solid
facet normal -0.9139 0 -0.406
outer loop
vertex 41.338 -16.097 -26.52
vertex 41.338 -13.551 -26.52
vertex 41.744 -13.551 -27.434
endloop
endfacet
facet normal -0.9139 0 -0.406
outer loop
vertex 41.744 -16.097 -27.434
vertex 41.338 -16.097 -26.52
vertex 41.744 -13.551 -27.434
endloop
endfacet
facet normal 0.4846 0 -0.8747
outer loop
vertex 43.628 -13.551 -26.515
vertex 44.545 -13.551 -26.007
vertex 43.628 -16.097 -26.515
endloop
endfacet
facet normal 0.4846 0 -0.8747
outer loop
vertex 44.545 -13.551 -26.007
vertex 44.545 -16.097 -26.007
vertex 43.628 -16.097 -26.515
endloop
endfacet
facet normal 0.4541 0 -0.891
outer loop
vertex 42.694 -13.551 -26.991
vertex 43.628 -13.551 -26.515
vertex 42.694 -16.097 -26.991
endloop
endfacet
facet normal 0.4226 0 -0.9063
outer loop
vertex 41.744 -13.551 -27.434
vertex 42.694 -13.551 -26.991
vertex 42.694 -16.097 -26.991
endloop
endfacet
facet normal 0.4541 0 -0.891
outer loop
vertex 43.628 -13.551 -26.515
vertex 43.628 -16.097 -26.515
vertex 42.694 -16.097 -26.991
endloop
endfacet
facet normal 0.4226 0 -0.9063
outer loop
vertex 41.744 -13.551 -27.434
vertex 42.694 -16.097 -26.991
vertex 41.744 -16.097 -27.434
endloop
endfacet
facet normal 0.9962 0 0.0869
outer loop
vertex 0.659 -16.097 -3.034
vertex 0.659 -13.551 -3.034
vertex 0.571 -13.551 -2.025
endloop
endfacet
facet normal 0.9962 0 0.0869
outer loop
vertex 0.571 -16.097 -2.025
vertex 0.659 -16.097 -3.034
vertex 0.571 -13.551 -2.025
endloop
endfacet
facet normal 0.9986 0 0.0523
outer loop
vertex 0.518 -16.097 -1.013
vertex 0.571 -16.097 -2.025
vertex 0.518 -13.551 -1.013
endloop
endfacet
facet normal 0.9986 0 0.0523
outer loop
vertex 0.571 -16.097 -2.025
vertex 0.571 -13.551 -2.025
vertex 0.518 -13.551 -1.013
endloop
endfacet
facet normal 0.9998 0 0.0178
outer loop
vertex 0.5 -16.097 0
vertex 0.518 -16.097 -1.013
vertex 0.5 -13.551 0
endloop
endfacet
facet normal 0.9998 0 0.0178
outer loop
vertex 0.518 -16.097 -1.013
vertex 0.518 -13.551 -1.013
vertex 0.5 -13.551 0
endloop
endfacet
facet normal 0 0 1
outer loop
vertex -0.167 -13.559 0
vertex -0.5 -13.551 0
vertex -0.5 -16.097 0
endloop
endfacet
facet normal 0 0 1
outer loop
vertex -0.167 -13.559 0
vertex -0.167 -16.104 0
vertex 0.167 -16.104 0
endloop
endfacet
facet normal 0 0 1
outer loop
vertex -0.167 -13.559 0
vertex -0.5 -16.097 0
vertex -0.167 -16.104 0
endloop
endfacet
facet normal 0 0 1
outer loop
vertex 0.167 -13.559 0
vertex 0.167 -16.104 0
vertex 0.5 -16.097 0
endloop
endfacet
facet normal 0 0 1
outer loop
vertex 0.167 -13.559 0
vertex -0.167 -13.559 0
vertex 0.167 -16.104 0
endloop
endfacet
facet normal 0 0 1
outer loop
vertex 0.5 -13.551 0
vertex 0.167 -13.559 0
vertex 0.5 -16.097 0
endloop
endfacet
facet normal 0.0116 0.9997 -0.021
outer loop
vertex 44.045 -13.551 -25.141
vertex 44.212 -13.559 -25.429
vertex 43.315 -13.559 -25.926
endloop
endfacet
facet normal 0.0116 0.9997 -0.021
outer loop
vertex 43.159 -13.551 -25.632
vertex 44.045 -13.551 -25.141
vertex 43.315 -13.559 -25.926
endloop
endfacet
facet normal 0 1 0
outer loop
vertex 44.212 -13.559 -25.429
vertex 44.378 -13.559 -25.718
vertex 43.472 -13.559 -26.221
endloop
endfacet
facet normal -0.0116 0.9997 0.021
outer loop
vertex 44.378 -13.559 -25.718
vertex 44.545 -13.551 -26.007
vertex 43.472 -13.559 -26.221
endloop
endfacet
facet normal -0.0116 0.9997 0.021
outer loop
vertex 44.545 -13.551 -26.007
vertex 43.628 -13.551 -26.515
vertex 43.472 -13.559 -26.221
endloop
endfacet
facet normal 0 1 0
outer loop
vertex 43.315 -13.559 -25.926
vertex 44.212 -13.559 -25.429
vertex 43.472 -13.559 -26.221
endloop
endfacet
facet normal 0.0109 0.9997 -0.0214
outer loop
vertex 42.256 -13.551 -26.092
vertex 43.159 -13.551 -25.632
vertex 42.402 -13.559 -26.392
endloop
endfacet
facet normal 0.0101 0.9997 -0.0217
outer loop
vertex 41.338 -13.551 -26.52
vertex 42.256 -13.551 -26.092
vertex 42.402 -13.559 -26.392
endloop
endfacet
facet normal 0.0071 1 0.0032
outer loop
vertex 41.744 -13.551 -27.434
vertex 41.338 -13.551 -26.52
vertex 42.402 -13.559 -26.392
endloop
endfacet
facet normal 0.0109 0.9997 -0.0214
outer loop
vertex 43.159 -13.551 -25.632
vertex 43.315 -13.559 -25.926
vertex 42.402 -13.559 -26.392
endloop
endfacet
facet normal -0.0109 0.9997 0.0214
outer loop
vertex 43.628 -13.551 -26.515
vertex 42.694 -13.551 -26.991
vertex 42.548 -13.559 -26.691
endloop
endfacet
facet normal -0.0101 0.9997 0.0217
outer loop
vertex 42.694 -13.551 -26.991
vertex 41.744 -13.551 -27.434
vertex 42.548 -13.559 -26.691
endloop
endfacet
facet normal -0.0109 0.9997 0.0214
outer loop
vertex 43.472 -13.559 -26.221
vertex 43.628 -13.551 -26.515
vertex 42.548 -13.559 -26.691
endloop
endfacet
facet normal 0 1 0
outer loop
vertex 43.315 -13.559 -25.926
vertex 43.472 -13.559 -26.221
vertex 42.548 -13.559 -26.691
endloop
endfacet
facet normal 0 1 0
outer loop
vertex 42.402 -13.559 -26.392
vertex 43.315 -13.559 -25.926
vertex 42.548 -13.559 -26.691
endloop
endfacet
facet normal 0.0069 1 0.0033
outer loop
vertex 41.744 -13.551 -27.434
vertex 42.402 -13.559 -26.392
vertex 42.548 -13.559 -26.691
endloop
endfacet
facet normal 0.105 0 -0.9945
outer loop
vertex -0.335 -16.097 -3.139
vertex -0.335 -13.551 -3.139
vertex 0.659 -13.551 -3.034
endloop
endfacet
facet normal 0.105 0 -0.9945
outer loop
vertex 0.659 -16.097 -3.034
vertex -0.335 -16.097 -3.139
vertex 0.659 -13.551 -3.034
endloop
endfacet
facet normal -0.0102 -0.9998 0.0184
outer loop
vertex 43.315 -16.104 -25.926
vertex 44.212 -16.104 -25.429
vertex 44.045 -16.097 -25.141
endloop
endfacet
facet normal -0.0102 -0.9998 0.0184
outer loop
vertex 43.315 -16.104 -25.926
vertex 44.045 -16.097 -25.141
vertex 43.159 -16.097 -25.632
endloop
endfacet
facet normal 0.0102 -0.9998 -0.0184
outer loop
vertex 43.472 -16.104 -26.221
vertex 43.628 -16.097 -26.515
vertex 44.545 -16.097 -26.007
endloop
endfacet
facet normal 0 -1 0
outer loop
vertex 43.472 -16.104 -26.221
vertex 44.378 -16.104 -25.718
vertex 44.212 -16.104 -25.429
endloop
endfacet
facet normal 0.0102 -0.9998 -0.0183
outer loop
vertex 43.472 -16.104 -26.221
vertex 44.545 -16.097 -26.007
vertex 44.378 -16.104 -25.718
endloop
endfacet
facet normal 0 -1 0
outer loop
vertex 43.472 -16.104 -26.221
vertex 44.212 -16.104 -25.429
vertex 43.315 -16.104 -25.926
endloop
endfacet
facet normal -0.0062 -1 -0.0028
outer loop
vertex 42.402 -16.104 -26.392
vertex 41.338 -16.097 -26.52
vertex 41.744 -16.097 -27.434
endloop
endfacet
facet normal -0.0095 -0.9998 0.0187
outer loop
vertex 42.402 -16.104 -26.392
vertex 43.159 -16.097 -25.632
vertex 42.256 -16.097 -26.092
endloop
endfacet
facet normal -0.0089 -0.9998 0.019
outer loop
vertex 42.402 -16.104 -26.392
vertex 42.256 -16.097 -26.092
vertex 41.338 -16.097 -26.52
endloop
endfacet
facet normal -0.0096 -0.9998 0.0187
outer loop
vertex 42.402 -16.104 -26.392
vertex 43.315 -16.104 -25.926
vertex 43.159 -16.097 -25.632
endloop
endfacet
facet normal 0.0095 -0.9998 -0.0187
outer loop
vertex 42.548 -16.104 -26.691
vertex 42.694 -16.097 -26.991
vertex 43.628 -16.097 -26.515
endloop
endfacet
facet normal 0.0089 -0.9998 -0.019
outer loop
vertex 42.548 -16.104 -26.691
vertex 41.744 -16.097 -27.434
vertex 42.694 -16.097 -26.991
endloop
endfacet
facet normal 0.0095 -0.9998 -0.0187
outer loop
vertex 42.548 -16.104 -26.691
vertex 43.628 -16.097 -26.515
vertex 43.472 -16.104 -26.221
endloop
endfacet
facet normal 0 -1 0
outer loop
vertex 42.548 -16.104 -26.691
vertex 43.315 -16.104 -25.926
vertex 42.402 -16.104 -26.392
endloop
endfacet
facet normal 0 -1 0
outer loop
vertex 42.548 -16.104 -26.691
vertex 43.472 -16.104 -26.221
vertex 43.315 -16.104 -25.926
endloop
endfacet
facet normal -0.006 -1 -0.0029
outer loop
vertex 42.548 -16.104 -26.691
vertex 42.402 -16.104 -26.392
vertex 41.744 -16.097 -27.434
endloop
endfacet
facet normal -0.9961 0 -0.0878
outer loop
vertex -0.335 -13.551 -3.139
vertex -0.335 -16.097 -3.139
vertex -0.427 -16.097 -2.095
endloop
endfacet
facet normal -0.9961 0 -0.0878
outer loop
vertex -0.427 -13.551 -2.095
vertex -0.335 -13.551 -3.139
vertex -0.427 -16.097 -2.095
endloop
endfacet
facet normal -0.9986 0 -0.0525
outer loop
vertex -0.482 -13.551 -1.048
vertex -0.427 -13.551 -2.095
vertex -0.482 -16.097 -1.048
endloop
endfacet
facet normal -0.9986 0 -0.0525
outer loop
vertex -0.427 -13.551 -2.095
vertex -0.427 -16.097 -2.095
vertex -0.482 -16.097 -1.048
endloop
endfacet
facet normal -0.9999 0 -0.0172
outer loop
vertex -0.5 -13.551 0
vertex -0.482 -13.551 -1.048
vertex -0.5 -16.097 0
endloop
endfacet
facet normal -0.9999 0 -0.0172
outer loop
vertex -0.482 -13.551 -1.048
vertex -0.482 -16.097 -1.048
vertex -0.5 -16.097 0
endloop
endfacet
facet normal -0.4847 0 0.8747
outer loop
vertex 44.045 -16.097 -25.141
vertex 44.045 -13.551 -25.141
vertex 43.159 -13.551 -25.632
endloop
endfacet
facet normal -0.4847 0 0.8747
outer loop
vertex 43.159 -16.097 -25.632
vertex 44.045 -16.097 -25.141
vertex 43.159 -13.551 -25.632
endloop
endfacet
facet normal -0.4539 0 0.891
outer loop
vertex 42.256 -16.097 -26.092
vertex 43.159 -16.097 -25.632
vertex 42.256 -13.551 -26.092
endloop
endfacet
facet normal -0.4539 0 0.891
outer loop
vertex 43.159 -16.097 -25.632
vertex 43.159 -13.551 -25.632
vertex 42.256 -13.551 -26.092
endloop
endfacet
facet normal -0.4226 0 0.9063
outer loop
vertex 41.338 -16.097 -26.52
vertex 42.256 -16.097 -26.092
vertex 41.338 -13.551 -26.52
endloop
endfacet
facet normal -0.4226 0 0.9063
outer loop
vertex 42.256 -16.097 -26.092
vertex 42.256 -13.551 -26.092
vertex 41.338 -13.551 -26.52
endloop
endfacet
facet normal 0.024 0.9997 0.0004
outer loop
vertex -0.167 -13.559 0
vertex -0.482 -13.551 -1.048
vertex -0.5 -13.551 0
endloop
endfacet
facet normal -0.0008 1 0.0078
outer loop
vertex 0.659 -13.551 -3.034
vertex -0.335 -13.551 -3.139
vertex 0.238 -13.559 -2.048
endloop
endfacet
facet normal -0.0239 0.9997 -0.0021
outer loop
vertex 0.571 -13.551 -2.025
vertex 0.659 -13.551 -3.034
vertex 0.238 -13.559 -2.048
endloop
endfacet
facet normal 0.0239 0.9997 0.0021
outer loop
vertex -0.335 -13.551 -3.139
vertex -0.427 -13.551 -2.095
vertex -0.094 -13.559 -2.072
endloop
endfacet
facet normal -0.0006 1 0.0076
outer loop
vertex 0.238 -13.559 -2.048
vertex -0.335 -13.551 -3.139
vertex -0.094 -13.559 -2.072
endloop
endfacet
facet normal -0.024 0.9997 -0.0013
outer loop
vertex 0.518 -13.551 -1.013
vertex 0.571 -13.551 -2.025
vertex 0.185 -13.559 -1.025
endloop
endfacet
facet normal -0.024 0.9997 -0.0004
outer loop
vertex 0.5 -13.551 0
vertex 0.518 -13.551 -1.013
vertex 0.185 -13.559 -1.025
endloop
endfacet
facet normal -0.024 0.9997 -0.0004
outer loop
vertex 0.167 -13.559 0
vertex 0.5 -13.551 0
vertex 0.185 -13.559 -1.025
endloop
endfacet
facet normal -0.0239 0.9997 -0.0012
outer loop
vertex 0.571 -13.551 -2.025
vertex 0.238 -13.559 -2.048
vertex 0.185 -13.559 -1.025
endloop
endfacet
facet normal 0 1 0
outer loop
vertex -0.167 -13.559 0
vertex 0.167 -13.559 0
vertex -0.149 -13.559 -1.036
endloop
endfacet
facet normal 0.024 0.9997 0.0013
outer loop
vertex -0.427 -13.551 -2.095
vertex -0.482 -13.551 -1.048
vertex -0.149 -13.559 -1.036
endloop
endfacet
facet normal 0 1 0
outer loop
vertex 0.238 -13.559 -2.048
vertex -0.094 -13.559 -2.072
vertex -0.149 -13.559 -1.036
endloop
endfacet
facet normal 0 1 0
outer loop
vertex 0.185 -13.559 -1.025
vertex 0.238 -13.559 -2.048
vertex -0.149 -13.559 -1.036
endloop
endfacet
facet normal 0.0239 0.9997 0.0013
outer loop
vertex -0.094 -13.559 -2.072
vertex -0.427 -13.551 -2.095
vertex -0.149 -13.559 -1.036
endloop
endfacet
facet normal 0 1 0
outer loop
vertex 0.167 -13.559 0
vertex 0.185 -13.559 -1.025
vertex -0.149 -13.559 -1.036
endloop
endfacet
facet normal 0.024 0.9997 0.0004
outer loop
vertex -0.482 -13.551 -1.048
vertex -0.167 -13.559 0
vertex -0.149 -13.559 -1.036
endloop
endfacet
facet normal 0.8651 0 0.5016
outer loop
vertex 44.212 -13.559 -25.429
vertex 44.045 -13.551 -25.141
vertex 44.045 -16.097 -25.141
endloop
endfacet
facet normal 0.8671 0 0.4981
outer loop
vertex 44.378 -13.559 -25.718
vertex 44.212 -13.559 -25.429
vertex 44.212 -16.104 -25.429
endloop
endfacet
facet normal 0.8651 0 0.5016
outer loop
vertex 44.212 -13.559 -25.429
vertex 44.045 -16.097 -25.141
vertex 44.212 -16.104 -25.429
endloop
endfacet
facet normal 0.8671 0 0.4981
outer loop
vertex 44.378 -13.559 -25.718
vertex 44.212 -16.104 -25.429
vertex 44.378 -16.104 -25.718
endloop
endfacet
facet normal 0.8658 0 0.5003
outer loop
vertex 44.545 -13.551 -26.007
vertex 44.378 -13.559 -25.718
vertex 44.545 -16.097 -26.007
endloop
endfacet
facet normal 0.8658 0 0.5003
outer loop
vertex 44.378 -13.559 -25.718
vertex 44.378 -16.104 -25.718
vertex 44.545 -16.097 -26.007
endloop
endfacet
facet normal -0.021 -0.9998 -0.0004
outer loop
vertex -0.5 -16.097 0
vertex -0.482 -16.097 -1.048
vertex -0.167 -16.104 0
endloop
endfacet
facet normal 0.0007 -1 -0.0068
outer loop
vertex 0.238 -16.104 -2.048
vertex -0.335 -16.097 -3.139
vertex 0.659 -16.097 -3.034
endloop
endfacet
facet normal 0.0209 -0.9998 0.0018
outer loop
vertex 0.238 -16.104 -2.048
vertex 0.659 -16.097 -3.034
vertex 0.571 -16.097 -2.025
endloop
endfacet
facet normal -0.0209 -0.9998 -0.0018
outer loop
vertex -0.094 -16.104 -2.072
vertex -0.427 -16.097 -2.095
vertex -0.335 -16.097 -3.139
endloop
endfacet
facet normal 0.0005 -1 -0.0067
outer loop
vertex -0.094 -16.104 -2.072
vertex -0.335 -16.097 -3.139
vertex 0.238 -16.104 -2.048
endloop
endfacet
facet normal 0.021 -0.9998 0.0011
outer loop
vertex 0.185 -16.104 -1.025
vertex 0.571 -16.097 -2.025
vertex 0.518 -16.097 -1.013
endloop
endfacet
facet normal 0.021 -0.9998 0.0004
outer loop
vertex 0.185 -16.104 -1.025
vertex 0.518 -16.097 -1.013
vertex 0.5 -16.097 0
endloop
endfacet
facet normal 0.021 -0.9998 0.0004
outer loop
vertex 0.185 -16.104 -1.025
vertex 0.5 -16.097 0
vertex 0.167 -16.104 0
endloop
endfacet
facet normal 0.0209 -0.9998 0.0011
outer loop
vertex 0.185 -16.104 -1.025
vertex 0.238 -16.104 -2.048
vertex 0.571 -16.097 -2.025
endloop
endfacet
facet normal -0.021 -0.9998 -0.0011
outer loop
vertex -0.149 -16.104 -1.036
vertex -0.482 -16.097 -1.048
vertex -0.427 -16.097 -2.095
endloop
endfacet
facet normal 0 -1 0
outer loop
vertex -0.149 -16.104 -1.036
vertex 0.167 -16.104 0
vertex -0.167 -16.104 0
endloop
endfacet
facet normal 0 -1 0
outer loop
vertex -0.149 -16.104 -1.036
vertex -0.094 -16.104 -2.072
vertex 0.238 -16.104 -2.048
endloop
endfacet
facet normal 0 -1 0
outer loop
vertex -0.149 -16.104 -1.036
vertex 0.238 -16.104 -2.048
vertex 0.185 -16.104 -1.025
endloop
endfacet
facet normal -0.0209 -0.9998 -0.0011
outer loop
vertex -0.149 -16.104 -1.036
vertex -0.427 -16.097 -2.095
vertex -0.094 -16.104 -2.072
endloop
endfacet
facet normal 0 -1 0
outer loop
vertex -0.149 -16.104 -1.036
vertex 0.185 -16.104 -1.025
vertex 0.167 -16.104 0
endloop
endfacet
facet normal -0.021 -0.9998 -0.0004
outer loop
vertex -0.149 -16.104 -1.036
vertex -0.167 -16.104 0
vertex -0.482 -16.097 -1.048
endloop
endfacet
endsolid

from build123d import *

# Parameters (mm, degrees)
CUT_EXTRUDE2_DEPTH = 20


with BuildPart() as part:
    # Sweep1: sweep along a path in Sketch2
    with BuildLine(Plane(origin=(0, 0, 0), x_dir=(1, 0, 0), z_dir=(0, 1, 0))) as sweep1_path:
        ThreePointArc((44.295, 25.573730174), (14.765, 25.573730174), (0, 0))
    # Sketch1 → Sweep1 (sweep)
    with BuildSketch(Plane.XY):
        with BuildLine():
            Line((-0.5, -13.550778575), (-0.5, -16.097236564))
            ThreePointArc((-0.5, -16.097236564), (0, -16.105), (0.5, -16.097236564))
            Line((0.5, -16.097236564), (0.5, -13.550778575))
            ThreePointArc((0.5, -13.550778575), (0, -13.56), (-0.5, -13.550778575))
        make_face()
    sweep(path=sweep1_path.line)

    # Sketch3 → Cut-Extrude2 (cut)
    with BuildSketch(Plane(origin=(0, 0, 0), x_dir=(1, 0, 0), z_dir=(0, 1, 0))):
        with BuildLine():
            ThreePointArc((0.659029377, 3.034461289), (15.015, 25.140717472), (41.337564748, 26.520224635))
            Line((41.337564748, 26.520224635), (41.744301392, 27.433770093))
            ThreePointArc((41.744301392, 27.433770093), (14.515, 26.006742876), (-0.335492518, 3.138989752))
            Line((-0.335492518, 3.138989752), (0.659029377, 3.034461289))
        make_face()
    extrude(amount=-CUT_EXTRUDE2_DEPTH, mode=Mode.SUBTRACT)


with BuildPart() as cut_extrude2_piece_1:
    # of the separate pieces the step leaves, piece 1, a body of its own (cut_extrude2_pieces)
    add(part.part.solids().sort_by_distance((44.045, -16.097236564, -25.140717472))[0])


with BuildPart() as cut_extrude2_piece_2:
    # of the separate pieces the step leaves, piece 2, a body of its own (cut_extrude2_pieces)
    add(part.part.solids().sort_by_distance((0.659029377, -13.550778575, -3.034461289))[0])


solid = Compound([cut_extrude2_piece_1.part, cut_extrude2_piece_2.part])
